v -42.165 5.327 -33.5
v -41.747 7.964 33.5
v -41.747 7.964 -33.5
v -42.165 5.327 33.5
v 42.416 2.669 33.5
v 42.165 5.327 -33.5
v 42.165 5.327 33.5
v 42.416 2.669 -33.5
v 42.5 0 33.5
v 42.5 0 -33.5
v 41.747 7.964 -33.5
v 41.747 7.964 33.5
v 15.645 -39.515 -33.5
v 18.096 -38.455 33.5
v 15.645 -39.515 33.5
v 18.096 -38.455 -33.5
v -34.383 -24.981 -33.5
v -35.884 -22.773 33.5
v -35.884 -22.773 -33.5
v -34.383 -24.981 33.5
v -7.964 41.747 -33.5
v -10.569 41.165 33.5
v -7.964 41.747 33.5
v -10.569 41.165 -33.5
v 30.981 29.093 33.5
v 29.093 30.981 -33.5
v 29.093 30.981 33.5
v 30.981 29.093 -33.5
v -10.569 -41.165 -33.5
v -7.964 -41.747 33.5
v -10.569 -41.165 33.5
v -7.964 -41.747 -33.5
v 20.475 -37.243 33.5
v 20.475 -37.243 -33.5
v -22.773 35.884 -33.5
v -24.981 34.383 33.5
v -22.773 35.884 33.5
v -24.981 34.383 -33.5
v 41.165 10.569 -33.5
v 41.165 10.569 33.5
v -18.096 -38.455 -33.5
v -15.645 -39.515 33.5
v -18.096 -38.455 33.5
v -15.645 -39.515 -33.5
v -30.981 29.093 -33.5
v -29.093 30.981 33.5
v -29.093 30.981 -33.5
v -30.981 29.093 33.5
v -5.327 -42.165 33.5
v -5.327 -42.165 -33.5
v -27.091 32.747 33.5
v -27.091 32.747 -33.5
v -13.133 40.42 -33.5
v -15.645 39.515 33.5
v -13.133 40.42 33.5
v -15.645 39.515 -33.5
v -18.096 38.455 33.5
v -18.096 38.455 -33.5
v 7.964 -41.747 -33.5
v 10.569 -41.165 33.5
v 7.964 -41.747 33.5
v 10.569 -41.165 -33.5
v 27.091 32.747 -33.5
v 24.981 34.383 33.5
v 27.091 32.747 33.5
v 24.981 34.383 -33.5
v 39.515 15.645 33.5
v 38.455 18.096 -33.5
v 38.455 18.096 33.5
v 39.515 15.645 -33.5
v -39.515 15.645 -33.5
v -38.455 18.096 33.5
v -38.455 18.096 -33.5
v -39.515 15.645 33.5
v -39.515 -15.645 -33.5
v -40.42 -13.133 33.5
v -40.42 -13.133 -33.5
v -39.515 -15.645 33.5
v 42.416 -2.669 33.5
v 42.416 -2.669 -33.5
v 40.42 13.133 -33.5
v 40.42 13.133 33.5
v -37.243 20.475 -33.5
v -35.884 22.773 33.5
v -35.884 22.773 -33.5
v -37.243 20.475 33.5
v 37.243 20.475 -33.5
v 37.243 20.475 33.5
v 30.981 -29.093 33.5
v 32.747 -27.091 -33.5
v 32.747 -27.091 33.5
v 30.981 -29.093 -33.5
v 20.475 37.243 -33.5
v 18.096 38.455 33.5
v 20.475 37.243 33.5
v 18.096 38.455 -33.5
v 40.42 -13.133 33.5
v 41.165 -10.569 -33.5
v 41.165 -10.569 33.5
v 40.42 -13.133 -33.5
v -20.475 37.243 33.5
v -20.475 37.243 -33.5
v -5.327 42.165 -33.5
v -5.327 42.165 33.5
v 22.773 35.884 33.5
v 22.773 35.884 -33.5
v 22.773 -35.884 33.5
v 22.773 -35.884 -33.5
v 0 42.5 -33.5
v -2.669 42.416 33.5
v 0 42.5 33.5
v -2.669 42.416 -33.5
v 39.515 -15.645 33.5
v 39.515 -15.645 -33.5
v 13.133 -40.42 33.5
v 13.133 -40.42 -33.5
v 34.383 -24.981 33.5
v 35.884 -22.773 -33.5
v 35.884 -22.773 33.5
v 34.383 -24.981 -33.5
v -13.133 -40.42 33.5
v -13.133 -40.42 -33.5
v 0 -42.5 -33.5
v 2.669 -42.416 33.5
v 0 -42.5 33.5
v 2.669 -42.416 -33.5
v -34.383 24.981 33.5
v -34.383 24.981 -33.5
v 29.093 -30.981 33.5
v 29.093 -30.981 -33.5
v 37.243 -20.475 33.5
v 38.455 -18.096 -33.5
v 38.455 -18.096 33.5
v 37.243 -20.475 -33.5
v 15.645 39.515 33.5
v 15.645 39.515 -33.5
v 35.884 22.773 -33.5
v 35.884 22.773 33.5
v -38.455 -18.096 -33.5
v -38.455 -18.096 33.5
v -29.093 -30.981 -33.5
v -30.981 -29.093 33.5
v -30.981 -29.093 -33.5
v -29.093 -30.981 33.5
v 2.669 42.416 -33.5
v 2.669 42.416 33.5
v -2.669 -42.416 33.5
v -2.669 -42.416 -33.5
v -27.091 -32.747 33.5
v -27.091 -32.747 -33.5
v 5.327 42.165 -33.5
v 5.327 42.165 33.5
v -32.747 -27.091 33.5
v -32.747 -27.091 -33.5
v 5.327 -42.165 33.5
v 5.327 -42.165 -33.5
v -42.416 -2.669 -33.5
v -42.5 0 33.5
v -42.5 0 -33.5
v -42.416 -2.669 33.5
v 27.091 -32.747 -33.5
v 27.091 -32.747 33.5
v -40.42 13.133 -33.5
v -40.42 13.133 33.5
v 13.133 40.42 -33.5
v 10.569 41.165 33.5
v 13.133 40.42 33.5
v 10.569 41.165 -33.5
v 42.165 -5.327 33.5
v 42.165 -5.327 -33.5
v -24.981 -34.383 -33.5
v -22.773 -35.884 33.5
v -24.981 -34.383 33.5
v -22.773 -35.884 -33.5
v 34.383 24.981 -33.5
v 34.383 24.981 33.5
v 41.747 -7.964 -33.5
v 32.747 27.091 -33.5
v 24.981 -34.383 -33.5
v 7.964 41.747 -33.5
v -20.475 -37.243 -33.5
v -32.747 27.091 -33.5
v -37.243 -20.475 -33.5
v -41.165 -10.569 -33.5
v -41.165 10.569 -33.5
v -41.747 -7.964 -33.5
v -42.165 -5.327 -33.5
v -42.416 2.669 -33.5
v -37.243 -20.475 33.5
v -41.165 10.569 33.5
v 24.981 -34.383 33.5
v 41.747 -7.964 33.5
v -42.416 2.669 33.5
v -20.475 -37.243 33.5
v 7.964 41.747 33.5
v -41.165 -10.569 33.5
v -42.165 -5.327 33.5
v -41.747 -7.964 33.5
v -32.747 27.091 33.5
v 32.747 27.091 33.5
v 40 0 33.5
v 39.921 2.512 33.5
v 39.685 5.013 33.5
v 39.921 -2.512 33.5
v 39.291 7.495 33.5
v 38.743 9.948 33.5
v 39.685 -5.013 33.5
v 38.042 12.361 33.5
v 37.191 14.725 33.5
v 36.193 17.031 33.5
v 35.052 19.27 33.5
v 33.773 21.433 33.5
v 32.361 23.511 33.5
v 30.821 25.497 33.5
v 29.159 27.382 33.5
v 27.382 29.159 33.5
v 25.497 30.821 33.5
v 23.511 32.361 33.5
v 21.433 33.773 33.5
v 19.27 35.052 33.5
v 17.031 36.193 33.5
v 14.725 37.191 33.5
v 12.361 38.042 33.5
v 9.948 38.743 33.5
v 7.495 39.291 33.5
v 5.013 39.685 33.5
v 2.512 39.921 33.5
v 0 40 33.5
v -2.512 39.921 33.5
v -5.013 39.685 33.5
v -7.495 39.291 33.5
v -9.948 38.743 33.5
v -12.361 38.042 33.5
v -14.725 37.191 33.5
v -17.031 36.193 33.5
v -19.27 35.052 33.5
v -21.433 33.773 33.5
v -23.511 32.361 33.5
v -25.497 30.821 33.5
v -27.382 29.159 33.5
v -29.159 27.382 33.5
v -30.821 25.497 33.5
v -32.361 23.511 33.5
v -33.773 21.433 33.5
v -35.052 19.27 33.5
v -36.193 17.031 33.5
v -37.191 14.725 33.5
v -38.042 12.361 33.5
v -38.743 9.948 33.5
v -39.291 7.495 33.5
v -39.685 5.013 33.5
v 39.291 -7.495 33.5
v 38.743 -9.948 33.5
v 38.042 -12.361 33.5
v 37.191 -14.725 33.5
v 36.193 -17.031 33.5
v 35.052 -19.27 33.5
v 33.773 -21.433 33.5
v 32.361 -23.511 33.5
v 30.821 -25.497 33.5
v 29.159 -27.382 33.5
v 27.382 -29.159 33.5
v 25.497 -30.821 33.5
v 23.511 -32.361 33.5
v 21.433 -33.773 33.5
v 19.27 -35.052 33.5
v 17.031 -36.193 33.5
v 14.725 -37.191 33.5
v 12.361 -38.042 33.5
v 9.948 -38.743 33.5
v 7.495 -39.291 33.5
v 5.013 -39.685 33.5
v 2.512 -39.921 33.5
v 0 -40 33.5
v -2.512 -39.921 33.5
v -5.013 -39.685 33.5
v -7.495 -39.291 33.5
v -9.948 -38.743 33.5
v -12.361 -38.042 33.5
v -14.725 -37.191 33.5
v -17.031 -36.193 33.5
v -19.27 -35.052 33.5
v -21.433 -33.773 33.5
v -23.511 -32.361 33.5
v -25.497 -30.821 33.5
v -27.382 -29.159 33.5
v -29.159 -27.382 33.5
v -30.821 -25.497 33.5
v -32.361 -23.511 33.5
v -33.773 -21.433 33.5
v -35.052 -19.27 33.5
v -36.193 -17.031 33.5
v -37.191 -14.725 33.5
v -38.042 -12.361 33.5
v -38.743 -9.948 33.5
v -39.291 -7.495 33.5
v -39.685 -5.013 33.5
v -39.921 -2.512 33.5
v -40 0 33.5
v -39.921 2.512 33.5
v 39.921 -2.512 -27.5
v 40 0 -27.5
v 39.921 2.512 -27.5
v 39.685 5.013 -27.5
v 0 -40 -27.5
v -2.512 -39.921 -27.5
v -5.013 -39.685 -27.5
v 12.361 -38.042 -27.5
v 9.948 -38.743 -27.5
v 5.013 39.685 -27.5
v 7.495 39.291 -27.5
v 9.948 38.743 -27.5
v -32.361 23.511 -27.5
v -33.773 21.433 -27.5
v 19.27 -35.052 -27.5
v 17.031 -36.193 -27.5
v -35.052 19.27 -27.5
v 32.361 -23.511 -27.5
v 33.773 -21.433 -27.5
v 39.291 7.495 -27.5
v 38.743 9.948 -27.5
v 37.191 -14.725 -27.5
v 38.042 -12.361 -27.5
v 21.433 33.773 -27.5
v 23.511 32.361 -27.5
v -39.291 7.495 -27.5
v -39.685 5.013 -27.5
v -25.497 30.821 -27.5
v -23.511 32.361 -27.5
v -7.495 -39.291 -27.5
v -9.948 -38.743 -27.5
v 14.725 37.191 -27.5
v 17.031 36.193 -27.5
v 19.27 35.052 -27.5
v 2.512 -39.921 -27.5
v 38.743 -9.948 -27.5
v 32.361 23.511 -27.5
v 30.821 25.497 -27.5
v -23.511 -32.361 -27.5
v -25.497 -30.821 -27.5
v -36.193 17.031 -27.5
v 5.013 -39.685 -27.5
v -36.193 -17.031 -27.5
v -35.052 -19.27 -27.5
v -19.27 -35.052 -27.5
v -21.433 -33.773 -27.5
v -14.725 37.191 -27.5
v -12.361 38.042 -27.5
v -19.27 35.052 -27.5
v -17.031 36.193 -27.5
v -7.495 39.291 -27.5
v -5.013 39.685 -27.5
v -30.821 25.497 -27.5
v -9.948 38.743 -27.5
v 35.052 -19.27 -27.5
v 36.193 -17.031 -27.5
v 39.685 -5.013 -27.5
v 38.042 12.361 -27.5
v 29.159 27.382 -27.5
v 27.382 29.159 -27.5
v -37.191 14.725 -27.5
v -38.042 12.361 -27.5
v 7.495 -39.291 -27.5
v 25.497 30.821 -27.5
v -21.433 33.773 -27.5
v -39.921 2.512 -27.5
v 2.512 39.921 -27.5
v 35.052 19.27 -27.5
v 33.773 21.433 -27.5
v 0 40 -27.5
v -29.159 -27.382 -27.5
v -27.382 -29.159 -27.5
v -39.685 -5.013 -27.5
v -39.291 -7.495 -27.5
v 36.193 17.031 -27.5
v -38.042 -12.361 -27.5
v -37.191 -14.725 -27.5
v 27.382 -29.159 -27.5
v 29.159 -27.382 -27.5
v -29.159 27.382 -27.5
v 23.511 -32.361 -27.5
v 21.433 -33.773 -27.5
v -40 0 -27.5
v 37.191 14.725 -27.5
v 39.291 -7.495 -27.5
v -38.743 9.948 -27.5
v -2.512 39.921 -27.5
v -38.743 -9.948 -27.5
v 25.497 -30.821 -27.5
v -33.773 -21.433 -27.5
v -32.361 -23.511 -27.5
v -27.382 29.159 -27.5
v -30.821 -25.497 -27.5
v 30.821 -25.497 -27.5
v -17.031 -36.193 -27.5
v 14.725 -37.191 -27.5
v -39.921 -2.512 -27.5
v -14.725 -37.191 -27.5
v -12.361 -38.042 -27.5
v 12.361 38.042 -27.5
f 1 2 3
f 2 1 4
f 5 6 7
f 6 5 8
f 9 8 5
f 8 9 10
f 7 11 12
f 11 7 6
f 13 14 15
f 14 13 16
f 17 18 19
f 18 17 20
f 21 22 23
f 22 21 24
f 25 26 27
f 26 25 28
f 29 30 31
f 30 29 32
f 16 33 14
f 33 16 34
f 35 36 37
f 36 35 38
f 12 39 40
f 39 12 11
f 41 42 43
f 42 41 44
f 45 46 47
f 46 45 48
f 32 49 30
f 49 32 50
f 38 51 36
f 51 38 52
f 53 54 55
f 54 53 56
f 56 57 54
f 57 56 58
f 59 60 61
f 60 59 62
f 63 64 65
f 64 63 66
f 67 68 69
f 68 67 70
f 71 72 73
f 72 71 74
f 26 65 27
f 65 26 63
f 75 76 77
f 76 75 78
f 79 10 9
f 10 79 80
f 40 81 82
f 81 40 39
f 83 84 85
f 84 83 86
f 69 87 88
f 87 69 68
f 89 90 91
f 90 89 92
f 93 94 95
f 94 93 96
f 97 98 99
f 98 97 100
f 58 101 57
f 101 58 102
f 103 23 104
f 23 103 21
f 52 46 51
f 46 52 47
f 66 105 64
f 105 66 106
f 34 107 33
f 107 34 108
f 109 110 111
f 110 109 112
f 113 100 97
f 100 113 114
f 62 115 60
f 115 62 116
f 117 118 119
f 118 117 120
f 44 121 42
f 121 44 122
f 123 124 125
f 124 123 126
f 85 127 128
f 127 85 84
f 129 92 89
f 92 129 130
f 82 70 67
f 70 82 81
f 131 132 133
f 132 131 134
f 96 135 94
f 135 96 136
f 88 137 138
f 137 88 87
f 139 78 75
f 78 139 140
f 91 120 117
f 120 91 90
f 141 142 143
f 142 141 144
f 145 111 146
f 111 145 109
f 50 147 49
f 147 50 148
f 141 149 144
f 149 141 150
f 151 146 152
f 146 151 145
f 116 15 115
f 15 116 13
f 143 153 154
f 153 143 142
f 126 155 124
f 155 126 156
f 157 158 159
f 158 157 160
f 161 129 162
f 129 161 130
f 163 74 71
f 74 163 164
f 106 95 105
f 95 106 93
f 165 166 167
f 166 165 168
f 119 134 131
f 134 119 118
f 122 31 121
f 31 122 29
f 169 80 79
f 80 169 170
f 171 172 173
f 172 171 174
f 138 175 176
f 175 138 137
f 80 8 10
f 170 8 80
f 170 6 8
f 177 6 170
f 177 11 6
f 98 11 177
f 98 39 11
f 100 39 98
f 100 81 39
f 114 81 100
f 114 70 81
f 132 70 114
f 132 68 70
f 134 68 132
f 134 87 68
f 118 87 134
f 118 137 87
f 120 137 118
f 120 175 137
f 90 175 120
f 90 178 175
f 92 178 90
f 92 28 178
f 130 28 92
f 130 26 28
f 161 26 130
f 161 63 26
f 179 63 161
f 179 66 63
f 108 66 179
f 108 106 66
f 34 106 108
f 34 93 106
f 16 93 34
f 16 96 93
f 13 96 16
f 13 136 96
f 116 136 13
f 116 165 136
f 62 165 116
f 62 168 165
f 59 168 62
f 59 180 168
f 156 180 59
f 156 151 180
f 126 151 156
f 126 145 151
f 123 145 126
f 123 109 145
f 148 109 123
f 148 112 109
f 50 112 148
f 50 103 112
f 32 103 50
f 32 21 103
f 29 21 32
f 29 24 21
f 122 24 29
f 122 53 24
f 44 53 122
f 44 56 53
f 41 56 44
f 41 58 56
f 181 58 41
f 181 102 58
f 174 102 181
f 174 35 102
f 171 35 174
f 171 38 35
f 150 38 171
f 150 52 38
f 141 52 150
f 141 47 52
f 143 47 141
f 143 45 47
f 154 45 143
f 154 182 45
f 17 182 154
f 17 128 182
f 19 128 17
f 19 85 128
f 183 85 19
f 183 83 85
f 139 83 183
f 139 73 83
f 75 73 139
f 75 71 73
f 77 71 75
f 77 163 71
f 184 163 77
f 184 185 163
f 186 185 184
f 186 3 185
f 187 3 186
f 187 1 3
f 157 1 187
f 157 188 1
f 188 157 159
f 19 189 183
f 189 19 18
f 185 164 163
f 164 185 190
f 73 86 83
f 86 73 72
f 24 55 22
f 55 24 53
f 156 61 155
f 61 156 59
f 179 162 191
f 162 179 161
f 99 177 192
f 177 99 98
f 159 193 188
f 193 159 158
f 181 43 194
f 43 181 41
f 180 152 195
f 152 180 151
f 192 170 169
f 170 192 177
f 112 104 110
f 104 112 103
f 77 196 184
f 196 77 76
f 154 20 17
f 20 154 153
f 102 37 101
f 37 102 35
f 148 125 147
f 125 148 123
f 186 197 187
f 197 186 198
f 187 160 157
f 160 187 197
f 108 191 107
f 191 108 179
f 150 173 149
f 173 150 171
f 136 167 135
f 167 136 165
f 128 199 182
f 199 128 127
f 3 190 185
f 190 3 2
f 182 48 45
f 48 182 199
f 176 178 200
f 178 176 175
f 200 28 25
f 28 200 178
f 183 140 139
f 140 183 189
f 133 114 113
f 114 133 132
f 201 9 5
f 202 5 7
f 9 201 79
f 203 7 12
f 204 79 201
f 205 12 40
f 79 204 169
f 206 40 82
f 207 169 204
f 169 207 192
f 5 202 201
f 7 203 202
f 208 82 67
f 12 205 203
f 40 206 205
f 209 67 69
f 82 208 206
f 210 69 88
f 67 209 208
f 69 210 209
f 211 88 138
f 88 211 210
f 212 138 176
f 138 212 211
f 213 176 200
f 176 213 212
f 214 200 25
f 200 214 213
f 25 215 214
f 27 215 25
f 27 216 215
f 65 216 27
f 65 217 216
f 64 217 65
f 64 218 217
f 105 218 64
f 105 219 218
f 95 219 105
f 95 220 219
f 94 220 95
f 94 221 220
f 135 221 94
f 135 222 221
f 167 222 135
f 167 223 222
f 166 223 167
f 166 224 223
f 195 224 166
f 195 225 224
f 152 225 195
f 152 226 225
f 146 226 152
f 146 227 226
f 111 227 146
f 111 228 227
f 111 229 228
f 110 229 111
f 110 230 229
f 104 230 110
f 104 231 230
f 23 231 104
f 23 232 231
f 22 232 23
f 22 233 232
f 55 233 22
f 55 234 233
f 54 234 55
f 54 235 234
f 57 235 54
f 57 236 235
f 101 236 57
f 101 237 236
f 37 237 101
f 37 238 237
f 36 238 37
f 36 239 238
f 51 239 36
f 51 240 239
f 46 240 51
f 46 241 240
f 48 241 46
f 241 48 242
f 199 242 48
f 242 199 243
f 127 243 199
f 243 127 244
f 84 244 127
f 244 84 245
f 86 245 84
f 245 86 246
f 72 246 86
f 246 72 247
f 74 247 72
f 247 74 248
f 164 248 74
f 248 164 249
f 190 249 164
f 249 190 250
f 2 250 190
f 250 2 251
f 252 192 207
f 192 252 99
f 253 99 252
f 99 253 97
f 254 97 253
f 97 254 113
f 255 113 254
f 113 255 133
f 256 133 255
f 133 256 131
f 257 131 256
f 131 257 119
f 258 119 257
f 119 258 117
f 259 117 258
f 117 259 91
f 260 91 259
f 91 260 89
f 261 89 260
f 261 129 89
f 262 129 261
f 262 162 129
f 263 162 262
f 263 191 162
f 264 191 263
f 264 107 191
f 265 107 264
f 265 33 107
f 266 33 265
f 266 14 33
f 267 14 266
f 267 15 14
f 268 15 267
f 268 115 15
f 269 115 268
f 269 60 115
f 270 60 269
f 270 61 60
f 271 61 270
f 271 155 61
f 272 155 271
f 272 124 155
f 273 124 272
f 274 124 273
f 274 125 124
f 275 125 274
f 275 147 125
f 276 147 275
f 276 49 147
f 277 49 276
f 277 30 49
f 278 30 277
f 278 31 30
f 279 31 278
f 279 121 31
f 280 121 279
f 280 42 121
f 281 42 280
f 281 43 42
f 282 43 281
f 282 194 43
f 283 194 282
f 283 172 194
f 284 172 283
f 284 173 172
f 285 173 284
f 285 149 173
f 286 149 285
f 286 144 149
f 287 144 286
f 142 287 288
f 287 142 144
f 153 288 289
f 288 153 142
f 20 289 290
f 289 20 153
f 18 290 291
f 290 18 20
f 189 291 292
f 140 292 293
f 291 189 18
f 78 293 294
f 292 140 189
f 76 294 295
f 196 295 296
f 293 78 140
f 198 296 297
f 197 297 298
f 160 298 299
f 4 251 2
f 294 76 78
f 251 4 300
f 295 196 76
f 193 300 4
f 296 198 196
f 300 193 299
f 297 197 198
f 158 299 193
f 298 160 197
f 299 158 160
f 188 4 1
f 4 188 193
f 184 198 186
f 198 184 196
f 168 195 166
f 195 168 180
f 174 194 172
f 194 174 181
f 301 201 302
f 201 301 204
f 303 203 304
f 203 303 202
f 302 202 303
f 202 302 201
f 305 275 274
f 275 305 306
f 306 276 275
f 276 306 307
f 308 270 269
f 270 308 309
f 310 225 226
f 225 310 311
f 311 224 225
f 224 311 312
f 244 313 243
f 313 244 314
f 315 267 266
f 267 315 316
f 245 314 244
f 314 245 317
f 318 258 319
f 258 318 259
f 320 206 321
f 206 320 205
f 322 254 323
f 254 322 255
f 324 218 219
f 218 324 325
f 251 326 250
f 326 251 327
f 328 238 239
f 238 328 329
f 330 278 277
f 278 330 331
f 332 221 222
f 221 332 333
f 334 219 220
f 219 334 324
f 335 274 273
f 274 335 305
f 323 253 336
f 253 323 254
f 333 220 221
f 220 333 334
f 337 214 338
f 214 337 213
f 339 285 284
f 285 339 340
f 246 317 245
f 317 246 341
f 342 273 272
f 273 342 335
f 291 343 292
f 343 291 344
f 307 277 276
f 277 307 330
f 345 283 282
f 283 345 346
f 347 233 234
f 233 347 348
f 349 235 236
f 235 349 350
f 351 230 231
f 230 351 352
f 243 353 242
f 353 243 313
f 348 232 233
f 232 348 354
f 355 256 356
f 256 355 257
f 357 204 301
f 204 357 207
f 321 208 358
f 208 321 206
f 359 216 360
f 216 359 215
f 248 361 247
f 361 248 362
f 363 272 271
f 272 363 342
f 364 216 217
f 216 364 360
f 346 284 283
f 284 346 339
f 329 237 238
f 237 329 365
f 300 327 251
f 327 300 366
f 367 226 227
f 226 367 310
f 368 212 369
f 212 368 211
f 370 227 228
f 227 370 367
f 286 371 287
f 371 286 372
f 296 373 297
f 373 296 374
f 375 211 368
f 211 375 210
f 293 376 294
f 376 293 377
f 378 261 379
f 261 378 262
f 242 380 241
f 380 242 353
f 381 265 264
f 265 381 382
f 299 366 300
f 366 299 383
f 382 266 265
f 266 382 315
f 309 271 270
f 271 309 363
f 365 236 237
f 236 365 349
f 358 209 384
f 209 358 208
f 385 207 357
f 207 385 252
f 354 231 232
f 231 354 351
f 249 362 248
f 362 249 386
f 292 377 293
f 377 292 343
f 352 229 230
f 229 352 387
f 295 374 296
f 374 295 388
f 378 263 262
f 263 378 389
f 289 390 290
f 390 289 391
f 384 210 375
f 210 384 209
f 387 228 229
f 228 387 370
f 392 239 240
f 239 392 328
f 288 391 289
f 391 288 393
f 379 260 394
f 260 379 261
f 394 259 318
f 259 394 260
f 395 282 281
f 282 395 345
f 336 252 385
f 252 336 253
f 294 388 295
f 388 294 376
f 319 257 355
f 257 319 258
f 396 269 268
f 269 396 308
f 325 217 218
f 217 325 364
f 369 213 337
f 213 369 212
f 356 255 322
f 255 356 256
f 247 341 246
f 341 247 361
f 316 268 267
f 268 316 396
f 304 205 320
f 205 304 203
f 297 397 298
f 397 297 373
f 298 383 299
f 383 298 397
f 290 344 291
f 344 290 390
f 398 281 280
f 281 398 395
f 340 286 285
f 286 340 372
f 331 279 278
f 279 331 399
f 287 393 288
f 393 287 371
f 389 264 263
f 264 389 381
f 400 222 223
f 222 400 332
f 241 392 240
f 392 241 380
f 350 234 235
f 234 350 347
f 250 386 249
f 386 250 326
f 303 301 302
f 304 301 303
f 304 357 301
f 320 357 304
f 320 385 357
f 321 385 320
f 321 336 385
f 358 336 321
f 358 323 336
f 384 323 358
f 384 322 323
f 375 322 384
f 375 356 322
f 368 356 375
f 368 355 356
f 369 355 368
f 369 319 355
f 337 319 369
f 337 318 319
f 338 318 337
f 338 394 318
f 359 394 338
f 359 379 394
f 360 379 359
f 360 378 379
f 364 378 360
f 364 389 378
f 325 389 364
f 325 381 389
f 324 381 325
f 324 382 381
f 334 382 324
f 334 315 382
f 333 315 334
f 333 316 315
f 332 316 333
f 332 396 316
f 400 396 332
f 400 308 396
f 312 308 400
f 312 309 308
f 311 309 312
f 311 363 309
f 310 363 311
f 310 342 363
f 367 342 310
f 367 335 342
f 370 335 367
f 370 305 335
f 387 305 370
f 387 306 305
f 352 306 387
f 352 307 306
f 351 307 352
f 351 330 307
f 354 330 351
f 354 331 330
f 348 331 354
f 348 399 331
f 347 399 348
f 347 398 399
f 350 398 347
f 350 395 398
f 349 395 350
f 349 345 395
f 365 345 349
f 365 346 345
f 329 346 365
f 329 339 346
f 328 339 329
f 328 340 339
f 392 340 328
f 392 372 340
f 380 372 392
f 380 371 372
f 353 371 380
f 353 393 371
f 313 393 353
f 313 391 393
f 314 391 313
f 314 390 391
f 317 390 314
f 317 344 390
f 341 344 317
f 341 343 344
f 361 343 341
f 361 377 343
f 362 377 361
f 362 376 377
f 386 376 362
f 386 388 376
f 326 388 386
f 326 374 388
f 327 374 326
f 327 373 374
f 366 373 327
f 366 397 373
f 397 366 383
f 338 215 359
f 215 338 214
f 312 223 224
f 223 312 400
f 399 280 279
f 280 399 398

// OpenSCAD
$fn =100;

difference ()
{
    cylinder(67, d=85, center = true);
    translate([0,0,5]) cylinder(65, d=80, center = true);
}
